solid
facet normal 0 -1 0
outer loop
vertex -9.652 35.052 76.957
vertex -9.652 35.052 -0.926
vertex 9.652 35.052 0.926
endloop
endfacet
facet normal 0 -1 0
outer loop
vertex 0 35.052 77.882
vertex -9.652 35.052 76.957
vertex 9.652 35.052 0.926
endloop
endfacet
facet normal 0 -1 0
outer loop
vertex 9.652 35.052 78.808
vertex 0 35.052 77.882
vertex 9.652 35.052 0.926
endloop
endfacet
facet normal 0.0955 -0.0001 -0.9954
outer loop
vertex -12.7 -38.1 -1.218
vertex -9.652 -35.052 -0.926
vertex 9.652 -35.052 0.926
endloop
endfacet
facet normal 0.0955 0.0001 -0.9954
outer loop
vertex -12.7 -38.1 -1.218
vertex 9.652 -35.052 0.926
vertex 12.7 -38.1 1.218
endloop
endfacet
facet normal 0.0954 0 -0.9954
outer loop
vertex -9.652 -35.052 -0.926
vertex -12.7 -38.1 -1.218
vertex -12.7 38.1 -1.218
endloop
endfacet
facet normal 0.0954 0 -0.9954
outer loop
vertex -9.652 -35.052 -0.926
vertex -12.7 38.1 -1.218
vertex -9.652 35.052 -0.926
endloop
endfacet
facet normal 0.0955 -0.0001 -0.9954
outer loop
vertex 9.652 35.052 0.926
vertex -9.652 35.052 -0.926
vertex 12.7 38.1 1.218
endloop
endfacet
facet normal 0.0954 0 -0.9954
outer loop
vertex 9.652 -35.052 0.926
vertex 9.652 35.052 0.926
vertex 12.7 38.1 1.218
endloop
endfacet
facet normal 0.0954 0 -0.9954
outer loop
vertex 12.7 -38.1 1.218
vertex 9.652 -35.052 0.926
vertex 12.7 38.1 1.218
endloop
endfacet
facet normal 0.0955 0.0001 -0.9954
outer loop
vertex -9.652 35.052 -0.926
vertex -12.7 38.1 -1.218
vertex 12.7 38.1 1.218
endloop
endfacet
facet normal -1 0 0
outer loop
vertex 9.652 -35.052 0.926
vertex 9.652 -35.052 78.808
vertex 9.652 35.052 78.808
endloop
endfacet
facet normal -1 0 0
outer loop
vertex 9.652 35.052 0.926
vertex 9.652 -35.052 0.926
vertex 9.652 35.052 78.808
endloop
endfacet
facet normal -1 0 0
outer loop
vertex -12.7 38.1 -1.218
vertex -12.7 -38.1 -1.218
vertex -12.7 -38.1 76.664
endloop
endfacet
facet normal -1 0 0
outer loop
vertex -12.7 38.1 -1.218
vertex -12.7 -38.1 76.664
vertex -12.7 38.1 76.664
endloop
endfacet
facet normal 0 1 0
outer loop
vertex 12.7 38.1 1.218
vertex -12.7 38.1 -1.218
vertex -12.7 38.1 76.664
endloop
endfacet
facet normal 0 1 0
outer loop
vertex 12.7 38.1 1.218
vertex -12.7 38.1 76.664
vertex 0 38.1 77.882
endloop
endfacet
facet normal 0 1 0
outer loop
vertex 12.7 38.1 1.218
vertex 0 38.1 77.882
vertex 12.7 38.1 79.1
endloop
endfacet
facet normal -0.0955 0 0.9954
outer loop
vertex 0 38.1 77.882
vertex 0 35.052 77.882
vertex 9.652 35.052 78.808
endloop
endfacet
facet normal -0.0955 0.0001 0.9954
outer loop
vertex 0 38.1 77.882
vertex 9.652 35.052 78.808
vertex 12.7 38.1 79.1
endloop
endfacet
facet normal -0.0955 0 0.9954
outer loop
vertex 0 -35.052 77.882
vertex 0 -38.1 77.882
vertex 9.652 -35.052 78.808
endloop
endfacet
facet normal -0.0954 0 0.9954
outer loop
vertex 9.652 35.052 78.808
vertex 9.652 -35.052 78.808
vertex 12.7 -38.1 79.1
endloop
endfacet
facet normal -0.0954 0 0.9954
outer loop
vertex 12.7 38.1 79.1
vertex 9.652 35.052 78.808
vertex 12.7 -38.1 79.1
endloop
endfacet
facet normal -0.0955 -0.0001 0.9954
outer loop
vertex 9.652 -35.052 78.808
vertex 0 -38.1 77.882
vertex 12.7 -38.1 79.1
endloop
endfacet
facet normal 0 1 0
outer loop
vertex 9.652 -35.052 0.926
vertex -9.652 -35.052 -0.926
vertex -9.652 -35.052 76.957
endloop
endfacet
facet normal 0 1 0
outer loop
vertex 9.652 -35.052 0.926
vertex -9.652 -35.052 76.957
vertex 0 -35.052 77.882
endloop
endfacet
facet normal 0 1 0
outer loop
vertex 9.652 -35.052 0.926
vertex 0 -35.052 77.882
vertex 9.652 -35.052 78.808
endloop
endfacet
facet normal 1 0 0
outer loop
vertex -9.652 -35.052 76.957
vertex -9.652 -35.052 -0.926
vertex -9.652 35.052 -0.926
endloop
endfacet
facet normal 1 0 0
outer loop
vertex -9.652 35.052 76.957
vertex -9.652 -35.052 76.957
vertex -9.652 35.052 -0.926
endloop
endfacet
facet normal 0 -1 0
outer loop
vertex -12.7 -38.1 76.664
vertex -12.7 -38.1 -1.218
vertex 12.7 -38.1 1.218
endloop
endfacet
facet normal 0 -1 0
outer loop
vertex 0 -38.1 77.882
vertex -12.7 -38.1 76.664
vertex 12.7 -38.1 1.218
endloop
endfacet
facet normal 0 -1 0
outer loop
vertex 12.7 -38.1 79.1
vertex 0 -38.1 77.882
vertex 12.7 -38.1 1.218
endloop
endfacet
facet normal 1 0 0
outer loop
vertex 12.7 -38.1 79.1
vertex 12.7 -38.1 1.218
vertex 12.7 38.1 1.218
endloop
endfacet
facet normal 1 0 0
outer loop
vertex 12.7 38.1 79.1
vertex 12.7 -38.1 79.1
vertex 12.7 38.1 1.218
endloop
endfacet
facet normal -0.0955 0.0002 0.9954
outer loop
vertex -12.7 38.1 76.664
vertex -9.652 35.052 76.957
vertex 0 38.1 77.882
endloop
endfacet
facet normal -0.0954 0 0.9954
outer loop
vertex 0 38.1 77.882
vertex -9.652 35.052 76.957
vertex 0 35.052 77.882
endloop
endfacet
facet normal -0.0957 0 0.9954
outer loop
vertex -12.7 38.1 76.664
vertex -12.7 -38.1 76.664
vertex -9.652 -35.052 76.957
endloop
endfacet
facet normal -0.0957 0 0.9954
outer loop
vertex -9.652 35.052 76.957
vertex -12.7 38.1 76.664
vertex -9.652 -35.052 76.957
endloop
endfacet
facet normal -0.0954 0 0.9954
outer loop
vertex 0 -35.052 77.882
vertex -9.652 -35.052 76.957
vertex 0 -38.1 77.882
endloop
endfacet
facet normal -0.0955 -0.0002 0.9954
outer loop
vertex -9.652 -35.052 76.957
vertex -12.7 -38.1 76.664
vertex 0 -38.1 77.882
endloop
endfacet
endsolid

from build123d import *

# Parameters (mm, degrees)
SKETCH2_W               = 9.652
SKETCH2_H               = 3.048
SKETCH2_W_2             = 3.048
SKETCH2_H_2             = 35.052
BOSS_EXTRUDE1_DEPTH     = 77.882279
SKETCH3_W               = 25.4
SKETCH3_H               = 76.2
SKETCH3_W_2             = 19.304
SKETCH3_H_2             = 70.104
BOSS_EXTRUDE2_DEPTH     = 50
CUT_EXTRUDE1_DEPTH      = 1
CUT_EXTRUDE1_DEPTH_BACK = 77.2
SKETCH5_W               = 25.4
SKETCH5_H               = 76.2
SKETCH5_W_2             = 19.304
SKETCH5_H_2             = 70.104
BOSS_EXTRUDE3_DEPTH     = 50
CUT_EXTRUDE2_DEPTH      = 1
CUT_EXTRUDE2_DEPTH_BACK = 77.2


with BuildPart() as part:
    # Sketch2 → Boss-Extrude1 (new body)
    with BuildSketch(Plane.XY):
        Polygon((-12.7, 0), (-9.652, 0), (-9.652, 35.052), (-9.652, 38.1), (-12.7, 38.1), align=None)
        with Locations((-4.826, 36.576)):
            Rectangle(SKETCH2_W, SKETCH2_H)
        Polygon((0, 38.1), (0, 35.052), (9.652, 35.052), (9.652, 0), (12.7, 0), (12.7, 38.1), align=None)
        with Locations((11.176, -17.526)):
            Rectangle(SKETCH2_W_2, SKETCH2_H_2)
        Polygon((-9.652, -35.052), (-9.652, 0), (-12.7, 0), (-12.7, -38.1), (0, -38.1), (0, -35.052), align=None)
        Polygon((9.652, -35.052), (0, -35.052), (0, -38.1), (12.7, -38.1), (12.7, -35.052), align=None)
    extrude(amount=BOSS_EXTRUDE1_DEPTH)

    # Sketch3 → Boss-Extrude2 (add)
    with BuildSketch(Plane(origin=(0, 0, 0), x_dir=(-1, 0, 0), z_dir=(0, 0, -1))):
        Rectangle(SKETCH3_W, SKETCH3_H)
        Rectangle(SKETCH3_W_2, SKETCH3_H_2, mode=Mode.SUBTRACT)
    extrude(amount=BOSS_EXTRUDE2_DEPTH)

    # Sketch4 → Cut-Extrude1 (cut, two sides)
    with BuildSketch(Plane(origin=(0, 38.1, 0), x_dir=(1, 0, 0), z_dir=(0, 1, 0))) as cut_extrude1_sk:
        Polygon((-119.729528752, 11.480724374), (-12.7, 1.217788135), (-12.7, 42.627933021), align=None)
        Polygon((-12.7, 1.217788135), (0, 0), (9.501519639, 49.088910403), (-12.7, 42.627933021), align=None)
        Polygon((12.7, -1.217788135), (119.729528752, -11.480724374), (127.176846342, 66.185439926), (-112.282211162, 89.146888673), (-119.729528752, 11.480724374), (-12.7, 42.627933021), (-12.7, 50), (12.7, 50), align=None)
        Polygon((0, 0), (12.7, -1.217788135), (12.7, 50), (-12.7, 50), (-12.7, 42.627933021), (9.501519639, 49.088910403), align=None)
    extrude(amount=CUT_EXTRUDE1_DEPTH, mode=Mode.SUBTRACT)
    extrude(cut_extrude1_sk.sketch, amount=-CUT_EXTRUDE1_DEPTH_BACK, mode=Mode.SUBTRACT)

    # Sketch5 → Boss-Extrude3 (add)
    with BuildSketch(Plane.XY.offset(77.882278635)):
        Rectangle(SKETCH5_W, SKETCH5_H)
        Rectangle(SKETCH5_W_2, SKETCH5_H_2, mode=Mode.SUBTRACT)
    extrude(amount=BOSS_EXTRUDE3_DEPTH)

    # Sketch6 → Cut-Extrude2 (cut, two sides)
    with BuildSketch(Plane.XZ.offset(38.1)) as cut_extrude2_sk:
        Polygon((-113.161207677, 166.450733215), (-103.71485858, 67.93718224), (-12.7, 124.967023668), (-12.7, 127.882278635), (12.7, 127.882278635), (12.7, 79.100066771), (103.71485858, 87.827375031), (94.268509483, 186.340926006), align=None)
        Polygon((-12.7, 124.967023668), (-103.71485858, 67.93718224), (-12.7, 76.6644905), align=None)
        Polygon((-12.7, 127.882278635), (-12.7, 124.967023668), (-9.501519639, 126.971189038), (0, 77.882278635), (12.7, 79.100066771), (12.7, 127.882278635), align=None)
        Polygon((-12.7, 124.967023668), (-12.7, 76.6644905), (0, 77.882278635), (-9.501519639, 126.971189038), align=None)
    extrude(amount=CUT_EXTRUDE2_DEPTH, mode=Mode.SUBTRACT)
    extrude(cut_extrude2_sk.sketch, amount=-CUT_EXTRUDE2_DEPTH_BACK, mode=Mode.SUBTRACT)


solid = part.part
